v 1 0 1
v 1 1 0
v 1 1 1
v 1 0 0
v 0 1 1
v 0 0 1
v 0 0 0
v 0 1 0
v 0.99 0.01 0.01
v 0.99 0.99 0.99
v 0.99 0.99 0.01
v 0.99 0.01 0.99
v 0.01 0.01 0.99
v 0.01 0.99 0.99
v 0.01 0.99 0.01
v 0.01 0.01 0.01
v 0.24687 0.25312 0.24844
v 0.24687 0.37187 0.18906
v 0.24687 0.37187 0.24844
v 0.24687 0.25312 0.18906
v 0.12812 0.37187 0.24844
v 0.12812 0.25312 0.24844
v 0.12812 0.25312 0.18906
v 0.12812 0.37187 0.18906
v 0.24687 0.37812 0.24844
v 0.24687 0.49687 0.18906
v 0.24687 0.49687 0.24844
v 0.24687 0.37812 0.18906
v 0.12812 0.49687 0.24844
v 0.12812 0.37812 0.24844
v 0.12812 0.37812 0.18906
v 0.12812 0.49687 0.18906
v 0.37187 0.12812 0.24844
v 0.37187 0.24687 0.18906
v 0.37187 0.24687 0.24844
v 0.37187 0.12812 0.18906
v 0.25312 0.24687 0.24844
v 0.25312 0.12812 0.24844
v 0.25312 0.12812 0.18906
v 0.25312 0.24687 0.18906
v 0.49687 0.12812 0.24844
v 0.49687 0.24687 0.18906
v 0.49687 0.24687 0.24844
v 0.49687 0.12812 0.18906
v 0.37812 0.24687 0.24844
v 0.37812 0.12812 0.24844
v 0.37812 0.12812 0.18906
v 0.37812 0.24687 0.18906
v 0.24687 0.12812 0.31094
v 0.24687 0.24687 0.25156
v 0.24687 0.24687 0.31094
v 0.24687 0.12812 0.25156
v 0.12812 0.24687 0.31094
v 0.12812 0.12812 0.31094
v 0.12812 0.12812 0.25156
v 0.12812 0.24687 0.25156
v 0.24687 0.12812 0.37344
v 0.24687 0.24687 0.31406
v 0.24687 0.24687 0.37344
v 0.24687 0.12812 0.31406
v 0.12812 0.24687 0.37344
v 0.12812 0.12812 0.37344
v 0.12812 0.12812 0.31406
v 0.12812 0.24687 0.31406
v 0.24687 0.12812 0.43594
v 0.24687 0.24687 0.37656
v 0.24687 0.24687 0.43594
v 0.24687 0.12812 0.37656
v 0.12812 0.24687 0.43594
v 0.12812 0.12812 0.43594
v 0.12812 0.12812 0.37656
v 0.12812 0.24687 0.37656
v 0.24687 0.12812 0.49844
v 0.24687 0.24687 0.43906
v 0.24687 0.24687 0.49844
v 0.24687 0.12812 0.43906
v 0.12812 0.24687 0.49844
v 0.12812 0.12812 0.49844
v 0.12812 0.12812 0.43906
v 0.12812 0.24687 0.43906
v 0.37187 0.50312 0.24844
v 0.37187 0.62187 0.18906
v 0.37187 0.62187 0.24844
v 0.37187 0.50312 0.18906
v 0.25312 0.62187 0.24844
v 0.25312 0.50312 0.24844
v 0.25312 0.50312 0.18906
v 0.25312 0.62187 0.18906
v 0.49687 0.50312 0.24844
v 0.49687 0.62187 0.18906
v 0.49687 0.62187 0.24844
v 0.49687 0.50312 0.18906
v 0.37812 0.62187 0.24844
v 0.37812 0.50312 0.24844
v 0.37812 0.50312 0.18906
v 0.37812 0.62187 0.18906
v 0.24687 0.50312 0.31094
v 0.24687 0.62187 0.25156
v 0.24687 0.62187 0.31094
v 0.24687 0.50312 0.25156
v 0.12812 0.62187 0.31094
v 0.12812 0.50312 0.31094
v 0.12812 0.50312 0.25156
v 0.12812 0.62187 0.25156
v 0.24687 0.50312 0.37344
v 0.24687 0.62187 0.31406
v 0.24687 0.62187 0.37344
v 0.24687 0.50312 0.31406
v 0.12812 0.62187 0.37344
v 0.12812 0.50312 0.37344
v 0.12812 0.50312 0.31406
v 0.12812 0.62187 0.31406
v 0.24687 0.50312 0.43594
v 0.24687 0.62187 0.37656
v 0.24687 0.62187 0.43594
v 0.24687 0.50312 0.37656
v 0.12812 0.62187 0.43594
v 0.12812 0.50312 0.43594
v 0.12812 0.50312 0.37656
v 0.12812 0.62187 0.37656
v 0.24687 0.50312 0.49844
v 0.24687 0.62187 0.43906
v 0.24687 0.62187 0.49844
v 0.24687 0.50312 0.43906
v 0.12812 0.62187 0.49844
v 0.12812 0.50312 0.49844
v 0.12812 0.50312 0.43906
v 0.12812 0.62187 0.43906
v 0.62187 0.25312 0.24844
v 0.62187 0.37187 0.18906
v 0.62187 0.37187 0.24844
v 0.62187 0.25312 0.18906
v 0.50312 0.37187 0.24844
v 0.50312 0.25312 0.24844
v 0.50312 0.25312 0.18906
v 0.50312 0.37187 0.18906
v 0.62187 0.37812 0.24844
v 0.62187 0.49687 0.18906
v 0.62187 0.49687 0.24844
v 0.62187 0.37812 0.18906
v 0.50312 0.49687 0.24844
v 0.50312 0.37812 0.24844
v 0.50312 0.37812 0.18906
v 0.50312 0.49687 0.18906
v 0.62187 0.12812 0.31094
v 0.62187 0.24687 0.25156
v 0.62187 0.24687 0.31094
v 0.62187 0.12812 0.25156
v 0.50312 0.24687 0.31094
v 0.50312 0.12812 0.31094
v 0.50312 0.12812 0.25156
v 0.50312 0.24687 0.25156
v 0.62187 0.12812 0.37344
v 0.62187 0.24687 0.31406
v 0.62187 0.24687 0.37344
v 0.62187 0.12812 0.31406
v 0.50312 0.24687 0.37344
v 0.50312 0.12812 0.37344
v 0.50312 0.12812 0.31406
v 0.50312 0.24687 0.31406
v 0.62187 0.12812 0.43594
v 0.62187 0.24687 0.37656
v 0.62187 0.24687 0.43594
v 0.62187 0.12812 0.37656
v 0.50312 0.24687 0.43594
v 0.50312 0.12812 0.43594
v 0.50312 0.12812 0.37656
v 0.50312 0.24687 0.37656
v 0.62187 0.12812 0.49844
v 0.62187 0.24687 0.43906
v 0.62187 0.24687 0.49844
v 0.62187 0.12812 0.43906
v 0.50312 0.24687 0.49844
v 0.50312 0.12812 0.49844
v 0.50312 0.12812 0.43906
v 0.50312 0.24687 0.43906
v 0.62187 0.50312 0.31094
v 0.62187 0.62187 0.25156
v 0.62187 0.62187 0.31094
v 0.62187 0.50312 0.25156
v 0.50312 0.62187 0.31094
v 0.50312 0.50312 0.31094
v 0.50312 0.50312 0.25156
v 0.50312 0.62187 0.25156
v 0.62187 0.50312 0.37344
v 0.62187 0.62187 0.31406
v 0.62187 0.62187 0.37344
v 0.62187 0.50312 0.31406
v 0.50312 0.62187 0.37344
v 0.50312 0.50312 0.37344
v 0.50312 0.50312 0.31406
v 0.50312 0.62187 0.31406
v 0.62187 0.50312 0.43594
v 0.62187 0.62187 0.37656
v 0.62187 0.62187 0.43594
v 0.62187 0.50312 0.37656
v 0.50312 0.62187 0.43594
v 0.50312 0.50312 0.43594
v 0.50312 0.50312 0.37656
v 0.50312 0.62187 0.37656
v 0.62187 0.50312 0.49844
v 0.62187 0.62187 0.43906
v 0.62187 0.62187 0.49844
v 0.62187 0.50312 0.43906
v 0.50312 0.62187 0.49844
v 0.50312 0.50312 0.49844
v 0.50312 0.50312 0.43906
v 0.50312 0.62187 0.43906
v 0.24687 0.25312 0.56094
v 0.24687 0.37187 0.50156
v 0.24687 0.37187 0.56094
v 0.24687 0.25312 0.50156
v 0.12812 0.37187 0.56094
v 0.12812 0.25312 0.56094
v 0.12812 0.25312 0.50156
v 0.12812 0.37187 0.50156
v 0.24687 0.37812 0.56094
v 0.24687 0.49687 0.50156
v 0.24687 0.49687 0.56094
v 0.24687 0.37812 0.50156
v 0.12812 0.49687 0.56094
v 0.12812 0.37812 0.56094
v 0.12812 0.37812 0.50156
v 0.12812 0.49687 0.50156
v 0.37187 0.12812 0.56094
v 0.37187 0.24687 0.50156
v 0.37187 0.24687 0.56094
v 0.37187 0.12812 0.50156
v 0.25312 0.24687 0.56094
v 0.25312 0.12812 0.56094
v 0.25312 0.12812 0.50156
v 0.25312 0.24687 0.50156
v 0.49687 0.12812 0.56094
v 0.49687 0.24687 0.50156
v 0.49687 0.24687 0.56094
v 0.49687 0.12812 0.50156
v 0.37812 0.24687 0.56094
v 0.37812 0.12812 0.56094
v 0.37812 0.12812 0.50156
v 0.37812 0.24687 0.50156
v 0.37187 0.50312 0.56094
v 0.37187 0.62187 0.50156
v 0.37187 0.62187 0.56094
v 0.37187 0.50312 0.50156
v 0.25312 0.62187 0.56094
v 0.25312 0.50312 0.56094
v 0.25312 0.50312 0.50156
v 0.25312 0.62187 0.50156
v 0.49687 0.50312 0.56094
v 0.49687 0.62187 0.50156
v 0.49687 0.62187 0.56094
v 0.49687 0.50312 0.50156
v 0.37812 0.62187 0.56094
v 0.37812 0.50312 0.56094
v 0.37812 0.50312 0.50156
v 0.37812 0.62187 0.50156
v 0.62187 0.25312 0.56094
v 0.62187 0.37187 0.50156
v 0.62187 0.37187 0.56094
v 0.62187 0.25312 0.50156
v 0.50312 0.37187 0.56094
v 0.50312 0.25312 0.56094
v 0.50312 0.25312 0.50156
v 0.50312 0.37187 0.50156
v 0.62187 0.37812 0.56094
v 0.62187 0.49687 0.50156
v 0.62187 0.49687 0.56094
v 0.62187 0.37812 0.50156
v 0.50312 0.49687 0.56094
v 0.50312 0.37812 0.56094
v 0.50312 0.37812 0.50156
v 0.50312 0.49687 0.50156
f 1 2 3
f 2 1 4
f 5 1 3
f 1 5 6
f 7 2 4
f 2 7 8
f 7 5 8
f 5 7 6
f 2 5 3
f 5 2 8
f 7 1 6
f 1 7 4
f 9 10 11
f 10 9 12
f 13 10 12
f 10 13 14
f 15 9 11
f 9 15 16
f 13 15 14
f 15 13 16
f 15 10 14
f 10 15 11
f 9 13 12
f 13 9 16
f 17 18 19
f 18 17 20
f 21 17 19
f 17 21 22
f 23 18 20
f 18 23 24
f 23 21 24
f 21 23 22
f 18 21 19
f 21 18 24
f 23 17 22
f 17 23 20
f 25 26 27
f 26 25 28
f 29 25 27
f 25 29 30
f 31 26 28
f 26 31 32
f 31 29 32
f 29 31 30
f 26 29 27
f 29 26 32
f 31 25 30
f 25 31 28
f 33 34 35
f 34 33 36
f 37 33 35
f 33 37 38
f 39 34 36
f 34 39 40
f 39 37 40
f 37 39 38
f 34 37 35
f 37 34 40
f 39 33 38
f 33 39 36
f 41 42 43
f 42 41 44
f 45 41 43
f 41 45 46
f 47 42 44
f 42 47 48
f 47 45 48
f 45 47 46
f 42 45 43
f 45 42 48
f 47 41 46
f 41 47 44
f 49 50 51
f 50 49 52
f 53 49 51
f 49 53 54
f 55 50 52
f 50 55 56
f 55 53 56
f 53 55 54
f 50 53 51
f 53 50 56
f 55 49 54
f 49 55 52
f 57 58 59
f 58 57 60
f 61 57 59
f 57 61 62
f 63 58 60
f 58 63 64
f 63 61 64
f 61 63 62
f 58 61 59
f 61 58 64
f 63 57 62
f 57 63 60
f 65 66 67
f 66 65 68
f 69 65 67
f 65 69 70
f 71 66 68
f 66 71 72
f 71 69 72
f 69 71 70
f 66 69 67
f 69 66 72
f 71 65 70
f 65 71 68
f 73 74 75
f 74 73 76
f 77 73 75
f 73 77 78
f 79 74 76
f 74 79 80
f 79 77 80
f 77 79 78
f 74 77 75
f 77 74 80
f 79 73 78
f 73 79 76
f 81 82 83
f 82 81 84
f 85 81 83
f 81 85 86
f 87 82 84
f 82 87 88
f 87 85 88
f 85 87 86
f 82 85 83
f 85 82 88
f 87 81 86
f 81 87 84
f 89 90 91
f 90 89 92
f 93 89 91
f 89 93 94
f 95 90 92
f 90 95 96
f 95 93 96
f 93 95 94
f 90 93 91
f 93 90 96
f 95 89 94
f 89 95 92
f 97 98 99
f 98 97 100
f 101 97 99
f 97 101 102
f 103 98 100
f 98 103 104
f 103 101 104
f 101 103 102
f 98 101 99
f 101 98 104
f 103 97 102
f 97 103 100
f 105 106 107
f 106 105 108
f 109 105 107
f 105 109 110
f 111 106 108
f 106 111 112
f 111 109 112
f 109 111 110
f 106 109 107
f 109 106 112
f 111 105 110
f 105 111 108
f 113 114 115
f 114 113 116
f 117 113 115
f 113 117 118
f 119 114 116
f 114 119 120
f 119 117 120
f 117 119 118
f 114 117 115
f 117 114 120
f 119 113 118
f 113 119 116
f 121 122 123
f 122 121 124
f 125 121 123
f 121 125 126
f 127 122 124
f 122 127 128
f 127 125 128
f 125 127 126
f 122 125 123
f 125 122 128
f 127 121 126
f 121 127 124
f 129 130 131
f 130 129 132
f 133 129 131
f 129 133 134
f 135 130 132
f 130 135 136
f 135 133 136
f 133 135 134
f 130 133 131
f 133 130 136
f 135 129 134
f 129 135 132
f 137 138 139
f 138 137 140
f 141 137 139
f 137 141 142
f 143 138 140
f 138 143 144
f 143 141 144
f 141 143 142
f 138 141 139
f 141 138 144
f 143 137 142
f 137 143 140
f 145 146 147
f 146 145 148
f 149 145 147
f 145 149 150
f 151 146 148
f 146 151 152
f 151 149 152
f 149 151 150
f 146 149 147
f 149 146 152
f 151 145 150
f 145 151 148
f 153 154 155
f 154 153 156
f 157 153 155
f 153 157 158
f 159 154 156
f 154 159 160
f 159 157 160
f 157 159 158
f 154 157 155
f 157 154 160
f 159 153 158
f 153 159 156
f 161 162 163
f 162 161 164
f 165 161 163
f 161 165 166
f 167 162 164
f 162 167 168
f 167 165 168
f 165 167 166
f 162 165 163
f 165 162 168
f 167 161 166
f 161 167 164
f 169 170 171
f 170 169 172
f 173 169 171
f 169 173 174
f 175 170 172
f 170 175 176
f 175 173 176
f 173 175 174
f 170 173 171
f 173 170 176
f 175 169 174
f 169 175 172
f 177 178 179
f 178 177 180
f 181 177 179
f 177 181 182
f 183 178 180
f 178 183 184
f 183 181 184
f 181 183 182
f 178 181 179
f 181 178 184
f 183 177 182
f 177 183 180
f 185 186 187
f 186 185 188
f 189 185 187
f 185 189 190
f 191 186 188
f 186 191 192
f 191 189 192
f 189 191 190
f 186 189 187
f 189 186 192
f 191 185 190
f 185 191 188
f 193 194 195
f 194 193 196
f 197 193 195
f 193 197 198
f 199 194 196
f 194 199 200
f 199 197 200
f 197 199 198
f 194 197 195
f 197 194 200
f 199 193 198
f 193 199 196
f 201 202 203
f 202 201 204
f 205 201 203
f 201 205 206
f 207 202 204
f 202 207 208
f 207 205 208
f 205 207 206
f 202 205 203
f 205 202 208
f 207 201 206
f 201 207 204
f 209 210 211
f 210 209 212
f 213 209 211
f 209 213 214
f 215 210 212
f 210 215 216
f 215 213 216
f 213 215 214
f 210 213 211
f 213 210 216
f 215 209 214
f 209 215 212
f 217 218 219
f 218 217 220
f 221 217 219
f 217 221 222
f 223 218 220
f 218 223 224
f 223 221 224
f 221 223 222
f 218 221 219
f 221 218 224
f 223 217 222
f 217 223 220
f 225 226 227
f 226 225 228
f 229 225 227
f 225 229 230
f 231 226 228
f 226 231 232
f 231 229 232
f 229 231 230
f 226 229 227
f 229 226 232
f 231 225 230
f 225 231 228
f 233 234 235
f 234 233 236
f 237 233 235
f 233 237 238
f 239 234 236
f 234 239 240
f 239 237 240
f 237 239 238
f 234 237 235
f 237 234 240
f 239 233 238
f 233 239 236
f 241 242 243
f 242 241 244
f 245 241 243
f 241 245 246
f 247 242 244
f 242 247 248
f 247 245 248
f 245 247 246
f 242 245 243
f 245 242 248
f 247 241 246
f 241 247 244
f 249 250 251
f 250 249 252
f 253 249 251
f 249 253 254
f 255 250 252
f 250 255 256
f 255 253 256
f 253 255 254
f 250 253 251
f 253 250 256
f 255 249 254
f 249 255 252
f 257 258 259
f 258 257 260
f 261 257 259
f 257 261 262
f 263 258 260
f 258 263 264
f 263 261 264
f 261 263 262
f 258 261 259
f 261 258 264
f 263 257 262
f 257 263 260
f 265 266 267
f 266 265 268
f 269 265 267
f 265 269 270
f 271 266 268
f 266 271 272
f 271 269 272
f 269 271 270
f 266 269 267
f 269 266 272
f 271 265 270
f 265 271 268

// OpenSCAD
translate([0.1875, 0.3125, 0.21875]) color([0.5794216814438241, 0.8809414275444518, 0.8426516508652041]) cube([0.11875, 0.11875, 0.059375], center=true);
translate([0.1875, 0.4375, 0.21875]) color([0.8801612922603782, 0.08607486984137092, 0.7780420565876001]) cube([0.11875, 0.11875, 0.059375], center=true);
translate([0.3125, 0.1875, 0.21875]) color([0.3999241673751073, 0.7781768293822428, 0.17994174312030797]) cube([0.11875, 0.11875, 0.059375], center=true);
translate([0.4375, 0.1875, 0.21875]) color([0.8612539028001464, 0.20612804304271737, 0.0716566971794208]) cube([0.11875, 0.11875, 0.059375], center=true);
translate([0.1875, 0.1875, 0.28125]) color([0.07357161469597906, 0.6122625706172512, 0.47233280024488156]) cube([0.11875, 0.11875, 0.059375], center=true);
translate([0.1875, 0.1875, 0.34375]) color([0.39290555549602224, 0.994915172949262, 0.8592286834202727]) cube([0.11875, 0.11875, 0.059375], center=true);
translate([0.1875, 0.1875, 0.40625]) color([0.22041646972872964, 0.8819223083479422, 0.8797647989808851]) cube([0.11875, 0.11875, 0.059375], center=true);
translate([0.1875, 0.1875, 0.46875]) color([0.09314761773743008, 0.6896195509922893, 0.008992133453294526]) cube([0.11875, 0.11875, 0.059375], center=true);
translate([0.3125, 0.5625, 0.21875]) color([0.5648256285798902, 0.11017783112903601, 0.9331629341791823]) cube([0.11875, 0.11875, 0.059375], center=true);
translate([0.4375, 0.5625, 0.21875]) color([0.285732093058915, 0.9972907082686906, 0.43035138041270127]) cube([0.11875, 0.11875, 0.059375], center=true);
translate([0.1875, 0.5625, 0.28125]) color([0.023233455433319117, 0.06871308575857826, 0.5453747216879481]) cube([0.11875, 0.11875, 0.059375], center=true);
translate([0.1875, 0.5625, 0.34375]) color([0.8984396286425499, 0.5859064616194529, 0.7449753720931842]) cube([0.11875, 0.11875, 0.059375], center=true);
translate([0.1875, 0.5625, 0.40625]) color([0.2707752699193896, 0.8459477489491674, 0.09132789456200907]) cube([0.11875, 0.11875, 0.059375], center=true);
translate([0.1875, 0.5625, 0.46875]) color([0.6247581279428744, 0.47934345048609295, 0.5947774585800618]) cube([0.11875, 0.11875, 0.059375], center=true);
translate([0.5625, 0.3125, 0.21875]) color([0.0966219920005903, 0.9479164624195787, 0.03867810307276098]) cube([0.11875, 0.11875, 0.059375], center=true);
translate([0.5625, 0.4375, 0.21875]) color([0.512835063744571, 0.053860311320736765, 0.30390044531159677]) cube([0.11875, 0.11875, 0.059375], center=true);
translate([0.5625, 0.1875, 0.28125]) color([0.5358495200642227, 0.9581886502434868, 0.15063066354102805]) cube([0.11875, 0.11875, 0.059375], center=true);
translate([0.5625, 0.1875, 0.34375]) color([0.1394220362982439, 0.637424855918313, 0.017001375499370308]) cube([0.11875, 0.11875, 0.059375], center=true);
translate([0.5625, 0.1875, 0.40625]) color([0.9377550820767451, 0.10704945280218559, 0.012974712303721159]) cube([0.11875, 0.11875, 0.059375], center=true);
translate([0.5625, 0.1875, 0.46875]) color([0.6828930691735134, 0.21575444737763683, 0.7518975959475263]) cube([0.11875, 0.11875, 0.059375], center=true);
translate([0.5625, 0.5625, 0.28125]) color([0.2208957801718262, 0.27965542355534123, 0.48547641402265196]) cube([0.11875, 0.11875, 0.059375], center=true);
translate([0.5625, 0.5625, 0.34375]) color([0.7746477988255035, 0.42685371509966563, 0.004537012660128847]) cube([0.11875, 0.11875, 0.059375], center=true);
translate([0.5625, 0.5625, 0.40625]) color([0.8958040859934125, 0.32646365561422697, 0.6558366973263319]) cube([0.11875, 0.11875, 0.059375], center=true);
translate([0.5625, 0.5625, 0.46875]) color([0.2999215004668262, 0.24047631377962675, 0.888472330839678]) cube([0.11875, 0.11875, 0.059375], center=true);
translate([0.1875, 0.3125, 0.53125]) color([0.27511158803496616, 0.48498926117814256, 0.24069895137980524]) cube([0.11875, 0.11875, 0.059375], center=true);
translate([0.1875, 0.4375, 0.53125]) color([0.5644076030056127, 0.6013130228959247, 0.32784247344869977]) cube([0.11875, 0.11875, 0.059375], center=true);
translate([0.3125, 0.1875, 0.53125]) color([0.10332499460836353, 0.45449244433031355, 0.5491957598214638]) cube([0.11875, 0.11875, 0.059375], center=true);
translate([0.4375, 0.1875, 0.53125]) color([0.5728258837849703, 0.8403578958934066, 0.6982731030474273]) cube([0.11875, 0.11875, 0.059375], center=true);
translate([0.3125, 0.5625, 0.53125]) color([0.744308802772652, 0.7916154232432334, 0.5956182142848017]) cube([0.11875, 0.11875, 0.059375], center=true);
translate([0.4375, 0.5625, 0.53125]) color([0.30884718226322827, 0.1561086729656712, 0.5833011610744269]) cube([0.11875, 0.11875, 0.059375], center=true);
translate([0.5625, 0.3125, 0.53125]) color([0.5091085760857007, 0.2717177888884632, 0.9779894411811328]) cube([0.11875, 0.11875, 0.059375], center=true);
translate([0.5625, 0.4375, 0.53125]) color([0.6249697853011126, 0.1412589883945864, 0.5315062740206121]) cube([0.11875, 0.11875, 0.059375], center=true);
color([0.3,0.3,0.3,0.3]) difference() { cube([1,1,1]); translate([0.01,0.01,0.01]) cube([0.98,0.98,0.98]); }
